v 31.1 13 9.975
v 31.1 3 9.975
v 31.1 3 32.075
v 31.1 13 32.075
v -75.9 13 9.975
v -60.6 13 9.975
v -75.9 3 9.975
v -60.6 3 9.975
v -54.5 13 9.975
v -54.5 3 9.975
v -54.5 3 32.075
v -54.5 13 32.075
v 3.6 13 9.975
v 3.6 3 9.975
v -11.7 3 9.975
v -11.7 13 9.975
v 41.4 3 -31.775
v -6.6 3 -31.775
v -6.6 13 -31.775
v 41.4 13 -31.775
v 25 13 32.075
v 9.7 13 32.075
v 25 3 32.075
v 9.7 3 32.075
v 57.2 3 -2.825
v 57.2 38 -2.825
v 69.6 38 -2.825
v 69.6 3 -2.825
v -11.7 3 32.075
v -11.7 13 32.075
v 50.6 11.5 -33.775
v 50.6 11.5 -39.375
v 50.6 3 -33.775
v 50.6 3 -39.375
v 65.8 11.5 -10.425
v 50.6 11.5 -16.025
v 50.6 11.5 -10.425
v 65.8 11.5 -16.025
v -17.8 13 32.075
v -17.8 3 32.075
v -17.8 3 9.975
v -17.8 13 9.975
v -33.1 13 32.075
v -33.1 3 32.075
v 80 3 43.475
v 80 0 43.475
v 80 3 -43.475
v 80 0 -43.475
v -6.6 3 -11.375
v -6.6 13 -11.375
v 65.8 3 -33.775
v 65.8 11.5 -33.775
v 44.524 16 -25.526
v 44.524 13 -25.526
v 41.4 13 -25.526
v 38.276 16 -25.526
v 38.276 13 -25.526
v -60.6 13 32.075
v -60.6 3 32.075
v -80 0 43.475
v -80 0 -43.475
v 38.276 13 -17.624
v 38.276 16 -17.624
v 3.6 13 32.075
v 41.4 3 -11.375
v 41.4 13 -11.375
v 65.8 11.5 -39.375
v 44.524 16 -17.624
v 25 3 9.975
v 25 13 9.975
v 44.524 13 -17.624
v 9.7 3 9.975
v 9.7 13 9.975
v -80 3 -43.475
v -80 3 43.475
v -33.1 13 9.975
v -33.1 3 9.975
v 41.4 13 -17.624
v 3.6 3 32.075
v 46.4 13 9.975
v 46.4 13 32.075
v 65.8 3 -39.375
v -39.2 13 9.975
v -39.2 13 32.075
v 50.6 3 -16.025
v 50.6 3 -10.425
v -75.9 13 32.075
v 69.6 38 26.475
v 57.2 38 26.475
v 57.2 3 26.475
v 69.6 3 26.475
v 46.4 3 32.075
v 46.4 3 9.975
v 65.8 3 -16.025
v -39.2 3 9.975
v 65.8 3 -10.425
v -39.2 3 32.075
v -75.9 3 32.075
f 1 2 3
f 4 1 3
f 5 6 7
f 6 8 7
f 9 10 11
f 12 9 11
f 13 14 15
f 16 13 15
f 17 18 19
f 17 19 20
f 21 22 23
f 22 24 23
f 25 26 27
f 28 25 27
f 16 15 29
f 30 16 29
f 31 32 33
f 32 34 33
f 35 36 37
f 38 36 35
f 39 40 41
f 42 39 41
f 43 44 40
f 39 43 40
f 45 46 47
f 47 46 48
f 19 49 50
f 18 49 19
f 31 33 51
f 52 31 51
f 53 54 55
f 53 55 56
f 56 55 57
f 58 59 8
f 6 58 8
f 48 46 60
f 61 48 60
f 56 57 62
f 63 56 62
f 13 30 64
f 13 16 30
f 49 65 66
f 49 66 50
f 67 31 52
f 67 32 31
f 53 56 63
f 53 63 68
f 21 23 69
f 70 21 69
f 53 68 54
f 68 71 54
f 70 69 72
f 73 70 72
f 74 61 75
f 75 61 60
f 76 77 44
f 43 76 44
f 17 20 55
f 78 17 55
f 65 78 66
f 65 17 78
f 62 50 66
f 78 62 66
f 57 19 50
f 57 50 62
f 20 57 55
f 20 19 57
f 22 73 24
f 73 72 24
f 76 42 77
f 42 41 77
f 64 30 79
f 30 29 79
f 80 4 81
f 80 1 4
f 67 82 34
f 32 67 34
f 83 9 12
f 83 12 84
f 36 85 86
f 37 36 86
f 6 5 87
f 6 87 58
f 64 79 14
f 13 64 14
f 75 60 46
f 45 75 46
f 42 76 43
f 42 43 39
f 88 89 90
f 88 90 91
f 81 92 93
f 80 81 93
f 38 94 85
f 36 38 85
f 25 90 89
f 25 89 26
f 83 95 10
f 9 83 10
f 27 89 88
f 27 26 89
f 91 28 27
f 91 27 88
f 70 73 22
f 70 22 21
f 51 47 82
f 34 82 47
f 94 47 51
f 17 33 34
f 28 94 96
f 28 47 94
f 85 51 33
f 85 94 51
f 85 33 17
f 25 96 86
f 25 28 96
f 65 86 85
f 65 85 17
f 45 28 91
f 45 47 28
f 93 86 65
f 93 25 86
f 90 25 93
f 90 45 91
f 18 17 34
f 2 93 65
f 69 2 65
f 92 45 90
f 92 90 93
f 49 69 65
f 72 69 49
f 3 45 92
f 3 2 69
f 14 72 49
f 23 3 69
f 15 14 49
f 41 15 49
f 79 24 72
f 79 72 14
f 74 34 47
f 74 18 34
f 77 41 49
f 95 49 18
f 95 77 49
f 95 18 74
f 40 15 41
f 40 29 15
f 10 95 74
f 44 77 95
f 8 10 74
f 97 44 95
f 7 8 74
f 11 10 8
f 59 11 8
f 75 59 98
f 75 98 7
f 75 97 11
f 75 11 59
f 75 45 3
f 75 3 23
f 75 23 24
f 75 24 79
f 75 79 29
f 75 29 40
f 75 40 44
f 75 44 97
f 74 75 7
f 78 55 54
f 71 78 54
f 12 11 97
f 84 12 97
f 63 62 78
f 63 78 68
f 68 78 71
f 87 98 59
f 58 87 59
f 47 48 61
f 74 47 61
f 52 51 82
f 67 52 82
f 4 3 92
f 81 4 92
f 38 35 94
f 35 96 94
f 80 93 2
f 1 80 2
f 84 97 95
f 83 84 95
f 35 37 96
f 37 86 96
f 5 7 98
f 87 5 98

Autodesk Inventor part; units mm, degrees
ref_plane "YZ Plane" through (0, 0, 0) normal (1, 0, 0) x (0, 1, 0)
ref_plane "XZ Plane" through (0, 0, 0) normal (0, 1, 0) x (-1, 0, 0)
ref_plane "XY Plane" through (0, 0, 0) normal (0, 0, 1) x (1, 0, 0)
sketch "Sketch1" plane through (0, 0, 0) normal (0, 1, 0) x (-1, 0, 0)
  line L0 (-80, -43.475) -> (80, -43.475)
  line L1 (80, -43.475) -> (80, 43.475)
  line L2 (80, 43.475) -> (-80, 43.475)
  line L3 (-80, 43.475) -> (-80, -43.475)
  line L4 (-80, -43.475) -> (80, 43.475) construction
  line L5 (80, -43.475) -> (-80, 43.475) construction
  point P0 (0, 0)
  dimension "d0" = 160
  dimension "d1" = 86.95
extrude "Extrusion1" add sketch "Sketch1" along normal blind 3
sketch "Sketch2" plane through (0, 3, 0) normal (0, 1, 0) x (1, 0, 0)
  line L0 (-6.6, 31.775) -> (41.4, 31.775)
  line L1 (41.4, 31.775) -> (41.4, 11.375)
  line L2 (41.4, 11.375) -> (-6.6, 11.375)
  line L3 (-6.6, 11.375) -> (-6.6, 31.775)
  line L4 (80, -43.475) -> (80, 43.475) projected
  line L5 (-80, -43.475) -> (80, -43.475) projected
  line L6 (-75.9, -32.075) -> (-60.6, -32.075)
  line L7 (-60.6, -32.075) -> (-60.6, -9.975)
  line L8 (-60.6, -9.975) -> (-75.9, -9.975)
  line L9 (-75.9, -9.975) -> (-75.9, -32.075)
  line L10 (-80, 43.475) -> (-80, -43.475) projected
  line L11 (-54.5, -32.075) -> (-39.2, -32.075)
  line L12 (-39.2, -32.075) -> (-39.2, -9.975)
  line L13 (-39.2, -9.975) -> (-54.5, -9.975)
  line L14 (-54.5, -9.975) -> (-54.5, -32.075)
  line L15 (-33.1, -32.075) -> (-17.8, -32.075)
  line L16 (-17.8, -32.075) -> (-17.8, -9.975)
  line L17 (-17.8, -9.975) -> (-33.1, -9.975)
  line L18 (-33.1, -9.975) -> (-33.1, -32.075)
  line L19 (57.2, 2.825) -> (69.6, 2.825)
  line L20 (69.6, 2.825) -> (69.6, -26.475)
  line L21 (69.6, -26.475) -> (57.2, -26.475)
  line L22 (57.2, -26.475) -> (57.2, 2.825)
  line L23 (-11.7, -9.975) -> (-11.7, -32.075)
  line L24 (3.6, -9.975) -> (-11.7, -9.975)
  line L25 (3.6, -32.075) -> (3.6, -9.975)
  line L26 (-11.7, -32.075) -> (3.6, -32.075)
  line L27 (31.1, -9.975) -> (31.1, -32.075)
  line L28 (46.4, -9.975) -> (31.1, -9.975)
  line L29 (46.4, -32.075) -> (46.4, -9.975)
  line L30 (31.1, -32.075) -> (46.4, -32.075)
  line L31 (25, -9.975) -> (9.7, -9.975)
  line L32 (9.7, -32.075) -> (25, -32.075)
  line L33 (25, -32.075) -> (25, -9.975)
  line L34 (9.7, -9.975) -> (9.7, -32.075)
  line L35 (80, 43.475) -> (-80, 43.475) projected
  point P0 (0, 0)
  dimension "d6" = 48
  dimension "d7" = 20.4
  dimension "d26" = 15.3
  dimension "d27" = 22.1
  dimension "d29" = 4.1
  dimension "d30" = 15.3
  dimension "d32" = 15.3
  dimension "d36" = 12.4
  dimension "d37" = 29.3
  dimension "d38" = 15.3
  dimension "d42" = 15.3
  dimension "d44" = 15.3
  dimension "d46" = 6.1
  dimension "d47" = 6.1
  dimension "d48" = 6.1
  dimension "d49" = 6.1
  dimension "d50" = 6.1
  dimension "d51" = 11.4
  dimension "d52" = 10.4
  dimension "d53" = 17
  dimension "d54" = 73.4
  dimension "d55" = 11.7
extrude "Extrusion4" add sketch "Sketch2" along normal blind 10 contours L0 L1 L2 L3 | L9 L8 L7 L6 | L14 L13 L12 L11 | L18 L17 L16 L15 | L19 L20 L21 L22 | L24 L25 L26 L23 | L28 L29 L30 L27 | L33 L32 L34 L31
sketch "Sketch4" plane through (0, 13, 0) normal (0, 1, 0) x (1, 0, 0)
  line L0 (44.5244, 25.526) -> (38.2756, 25.526)
  line L1 (38.2756, 25.526) -> (38.2756, 17.624)
  line L2 (38.2756, 17.624) -> (44.5244, 17.624)
  line L3 (44.5244, 17.624) -> (44.5244, 25.526)
  line L4 (41.4, 11.375) -> (41.4, 31.775) projected
  line L5 (44.5244, 25.526) -> (38.2756, 17.624) construction
  line L6 (38.2756, 25.526) -> (44.5244, 17.624) construction
  point P0 (0, 0)
  point P1 (41.4, 21.575)
extrude "Extrusion5" add sketch "Sketch4" along normal blind 3
sketch "Sketch5" plane through (0, 3, 0) normal (0, 1, 0) x (1, 0, 0)
  line L0 (65.8, 16.025) -> (50.6, 16.025)
  line L1 (50.6, 16.025) -> (50.6, 10.425)
  line L2 (50.6, 10.425) -> (65.8, 10.425)
  line L3 (65.8, 10.425) -> (65.8, 16.025)
  line L4 (80, 43.475) -> (-80, 43.475) projected
  line L5 (80, -43.475) -> (80, 43.475) projected
  line L6 (65.8, 39.375) -> (50.6, 39.375)
  line L7 (50.6, 39.375) -> (50.6, 33.775)
  line L8 (50.6, 33.775) -> (65.8, 33.775)
  line L9 (65.8, 33.775) -> (65.8, 39.375)
  point P0 (0, 0)
  dimension "d60" = 15.2
  dimension "d61" = 5.6
  dimension "d62" = 27.45
  dimension "d63" = 14.2
  dimension "d64" = 15.2
  dimension "d65" = 5.6
  dimension "d66" = 4.1
extrude "Extrusion6" add sketch "Sketch5" along normal blind 8.5
sketch "Sketch6" plane through (0, 13, 0) normal (0, 1, 0) x (1, 0, 0)
  line L0 (57.2, -26.475) -> (69.6, -26.475) projected
  line L1 (69.6, -26.475) -> (57.2, -26.475)
  line L2 (57.2, -26.475) -> (57.2, 2.825)
  line L3 (57.2, 2.825) -> (69.6, 2.825)
  line L4 (69.6, 2.825) -> (69.6, -26.475)
  point P0 (0, 0)
extrude "Extrusion7" add sketch "Sketch6" along normal blind 25
properties part number "PCB"
